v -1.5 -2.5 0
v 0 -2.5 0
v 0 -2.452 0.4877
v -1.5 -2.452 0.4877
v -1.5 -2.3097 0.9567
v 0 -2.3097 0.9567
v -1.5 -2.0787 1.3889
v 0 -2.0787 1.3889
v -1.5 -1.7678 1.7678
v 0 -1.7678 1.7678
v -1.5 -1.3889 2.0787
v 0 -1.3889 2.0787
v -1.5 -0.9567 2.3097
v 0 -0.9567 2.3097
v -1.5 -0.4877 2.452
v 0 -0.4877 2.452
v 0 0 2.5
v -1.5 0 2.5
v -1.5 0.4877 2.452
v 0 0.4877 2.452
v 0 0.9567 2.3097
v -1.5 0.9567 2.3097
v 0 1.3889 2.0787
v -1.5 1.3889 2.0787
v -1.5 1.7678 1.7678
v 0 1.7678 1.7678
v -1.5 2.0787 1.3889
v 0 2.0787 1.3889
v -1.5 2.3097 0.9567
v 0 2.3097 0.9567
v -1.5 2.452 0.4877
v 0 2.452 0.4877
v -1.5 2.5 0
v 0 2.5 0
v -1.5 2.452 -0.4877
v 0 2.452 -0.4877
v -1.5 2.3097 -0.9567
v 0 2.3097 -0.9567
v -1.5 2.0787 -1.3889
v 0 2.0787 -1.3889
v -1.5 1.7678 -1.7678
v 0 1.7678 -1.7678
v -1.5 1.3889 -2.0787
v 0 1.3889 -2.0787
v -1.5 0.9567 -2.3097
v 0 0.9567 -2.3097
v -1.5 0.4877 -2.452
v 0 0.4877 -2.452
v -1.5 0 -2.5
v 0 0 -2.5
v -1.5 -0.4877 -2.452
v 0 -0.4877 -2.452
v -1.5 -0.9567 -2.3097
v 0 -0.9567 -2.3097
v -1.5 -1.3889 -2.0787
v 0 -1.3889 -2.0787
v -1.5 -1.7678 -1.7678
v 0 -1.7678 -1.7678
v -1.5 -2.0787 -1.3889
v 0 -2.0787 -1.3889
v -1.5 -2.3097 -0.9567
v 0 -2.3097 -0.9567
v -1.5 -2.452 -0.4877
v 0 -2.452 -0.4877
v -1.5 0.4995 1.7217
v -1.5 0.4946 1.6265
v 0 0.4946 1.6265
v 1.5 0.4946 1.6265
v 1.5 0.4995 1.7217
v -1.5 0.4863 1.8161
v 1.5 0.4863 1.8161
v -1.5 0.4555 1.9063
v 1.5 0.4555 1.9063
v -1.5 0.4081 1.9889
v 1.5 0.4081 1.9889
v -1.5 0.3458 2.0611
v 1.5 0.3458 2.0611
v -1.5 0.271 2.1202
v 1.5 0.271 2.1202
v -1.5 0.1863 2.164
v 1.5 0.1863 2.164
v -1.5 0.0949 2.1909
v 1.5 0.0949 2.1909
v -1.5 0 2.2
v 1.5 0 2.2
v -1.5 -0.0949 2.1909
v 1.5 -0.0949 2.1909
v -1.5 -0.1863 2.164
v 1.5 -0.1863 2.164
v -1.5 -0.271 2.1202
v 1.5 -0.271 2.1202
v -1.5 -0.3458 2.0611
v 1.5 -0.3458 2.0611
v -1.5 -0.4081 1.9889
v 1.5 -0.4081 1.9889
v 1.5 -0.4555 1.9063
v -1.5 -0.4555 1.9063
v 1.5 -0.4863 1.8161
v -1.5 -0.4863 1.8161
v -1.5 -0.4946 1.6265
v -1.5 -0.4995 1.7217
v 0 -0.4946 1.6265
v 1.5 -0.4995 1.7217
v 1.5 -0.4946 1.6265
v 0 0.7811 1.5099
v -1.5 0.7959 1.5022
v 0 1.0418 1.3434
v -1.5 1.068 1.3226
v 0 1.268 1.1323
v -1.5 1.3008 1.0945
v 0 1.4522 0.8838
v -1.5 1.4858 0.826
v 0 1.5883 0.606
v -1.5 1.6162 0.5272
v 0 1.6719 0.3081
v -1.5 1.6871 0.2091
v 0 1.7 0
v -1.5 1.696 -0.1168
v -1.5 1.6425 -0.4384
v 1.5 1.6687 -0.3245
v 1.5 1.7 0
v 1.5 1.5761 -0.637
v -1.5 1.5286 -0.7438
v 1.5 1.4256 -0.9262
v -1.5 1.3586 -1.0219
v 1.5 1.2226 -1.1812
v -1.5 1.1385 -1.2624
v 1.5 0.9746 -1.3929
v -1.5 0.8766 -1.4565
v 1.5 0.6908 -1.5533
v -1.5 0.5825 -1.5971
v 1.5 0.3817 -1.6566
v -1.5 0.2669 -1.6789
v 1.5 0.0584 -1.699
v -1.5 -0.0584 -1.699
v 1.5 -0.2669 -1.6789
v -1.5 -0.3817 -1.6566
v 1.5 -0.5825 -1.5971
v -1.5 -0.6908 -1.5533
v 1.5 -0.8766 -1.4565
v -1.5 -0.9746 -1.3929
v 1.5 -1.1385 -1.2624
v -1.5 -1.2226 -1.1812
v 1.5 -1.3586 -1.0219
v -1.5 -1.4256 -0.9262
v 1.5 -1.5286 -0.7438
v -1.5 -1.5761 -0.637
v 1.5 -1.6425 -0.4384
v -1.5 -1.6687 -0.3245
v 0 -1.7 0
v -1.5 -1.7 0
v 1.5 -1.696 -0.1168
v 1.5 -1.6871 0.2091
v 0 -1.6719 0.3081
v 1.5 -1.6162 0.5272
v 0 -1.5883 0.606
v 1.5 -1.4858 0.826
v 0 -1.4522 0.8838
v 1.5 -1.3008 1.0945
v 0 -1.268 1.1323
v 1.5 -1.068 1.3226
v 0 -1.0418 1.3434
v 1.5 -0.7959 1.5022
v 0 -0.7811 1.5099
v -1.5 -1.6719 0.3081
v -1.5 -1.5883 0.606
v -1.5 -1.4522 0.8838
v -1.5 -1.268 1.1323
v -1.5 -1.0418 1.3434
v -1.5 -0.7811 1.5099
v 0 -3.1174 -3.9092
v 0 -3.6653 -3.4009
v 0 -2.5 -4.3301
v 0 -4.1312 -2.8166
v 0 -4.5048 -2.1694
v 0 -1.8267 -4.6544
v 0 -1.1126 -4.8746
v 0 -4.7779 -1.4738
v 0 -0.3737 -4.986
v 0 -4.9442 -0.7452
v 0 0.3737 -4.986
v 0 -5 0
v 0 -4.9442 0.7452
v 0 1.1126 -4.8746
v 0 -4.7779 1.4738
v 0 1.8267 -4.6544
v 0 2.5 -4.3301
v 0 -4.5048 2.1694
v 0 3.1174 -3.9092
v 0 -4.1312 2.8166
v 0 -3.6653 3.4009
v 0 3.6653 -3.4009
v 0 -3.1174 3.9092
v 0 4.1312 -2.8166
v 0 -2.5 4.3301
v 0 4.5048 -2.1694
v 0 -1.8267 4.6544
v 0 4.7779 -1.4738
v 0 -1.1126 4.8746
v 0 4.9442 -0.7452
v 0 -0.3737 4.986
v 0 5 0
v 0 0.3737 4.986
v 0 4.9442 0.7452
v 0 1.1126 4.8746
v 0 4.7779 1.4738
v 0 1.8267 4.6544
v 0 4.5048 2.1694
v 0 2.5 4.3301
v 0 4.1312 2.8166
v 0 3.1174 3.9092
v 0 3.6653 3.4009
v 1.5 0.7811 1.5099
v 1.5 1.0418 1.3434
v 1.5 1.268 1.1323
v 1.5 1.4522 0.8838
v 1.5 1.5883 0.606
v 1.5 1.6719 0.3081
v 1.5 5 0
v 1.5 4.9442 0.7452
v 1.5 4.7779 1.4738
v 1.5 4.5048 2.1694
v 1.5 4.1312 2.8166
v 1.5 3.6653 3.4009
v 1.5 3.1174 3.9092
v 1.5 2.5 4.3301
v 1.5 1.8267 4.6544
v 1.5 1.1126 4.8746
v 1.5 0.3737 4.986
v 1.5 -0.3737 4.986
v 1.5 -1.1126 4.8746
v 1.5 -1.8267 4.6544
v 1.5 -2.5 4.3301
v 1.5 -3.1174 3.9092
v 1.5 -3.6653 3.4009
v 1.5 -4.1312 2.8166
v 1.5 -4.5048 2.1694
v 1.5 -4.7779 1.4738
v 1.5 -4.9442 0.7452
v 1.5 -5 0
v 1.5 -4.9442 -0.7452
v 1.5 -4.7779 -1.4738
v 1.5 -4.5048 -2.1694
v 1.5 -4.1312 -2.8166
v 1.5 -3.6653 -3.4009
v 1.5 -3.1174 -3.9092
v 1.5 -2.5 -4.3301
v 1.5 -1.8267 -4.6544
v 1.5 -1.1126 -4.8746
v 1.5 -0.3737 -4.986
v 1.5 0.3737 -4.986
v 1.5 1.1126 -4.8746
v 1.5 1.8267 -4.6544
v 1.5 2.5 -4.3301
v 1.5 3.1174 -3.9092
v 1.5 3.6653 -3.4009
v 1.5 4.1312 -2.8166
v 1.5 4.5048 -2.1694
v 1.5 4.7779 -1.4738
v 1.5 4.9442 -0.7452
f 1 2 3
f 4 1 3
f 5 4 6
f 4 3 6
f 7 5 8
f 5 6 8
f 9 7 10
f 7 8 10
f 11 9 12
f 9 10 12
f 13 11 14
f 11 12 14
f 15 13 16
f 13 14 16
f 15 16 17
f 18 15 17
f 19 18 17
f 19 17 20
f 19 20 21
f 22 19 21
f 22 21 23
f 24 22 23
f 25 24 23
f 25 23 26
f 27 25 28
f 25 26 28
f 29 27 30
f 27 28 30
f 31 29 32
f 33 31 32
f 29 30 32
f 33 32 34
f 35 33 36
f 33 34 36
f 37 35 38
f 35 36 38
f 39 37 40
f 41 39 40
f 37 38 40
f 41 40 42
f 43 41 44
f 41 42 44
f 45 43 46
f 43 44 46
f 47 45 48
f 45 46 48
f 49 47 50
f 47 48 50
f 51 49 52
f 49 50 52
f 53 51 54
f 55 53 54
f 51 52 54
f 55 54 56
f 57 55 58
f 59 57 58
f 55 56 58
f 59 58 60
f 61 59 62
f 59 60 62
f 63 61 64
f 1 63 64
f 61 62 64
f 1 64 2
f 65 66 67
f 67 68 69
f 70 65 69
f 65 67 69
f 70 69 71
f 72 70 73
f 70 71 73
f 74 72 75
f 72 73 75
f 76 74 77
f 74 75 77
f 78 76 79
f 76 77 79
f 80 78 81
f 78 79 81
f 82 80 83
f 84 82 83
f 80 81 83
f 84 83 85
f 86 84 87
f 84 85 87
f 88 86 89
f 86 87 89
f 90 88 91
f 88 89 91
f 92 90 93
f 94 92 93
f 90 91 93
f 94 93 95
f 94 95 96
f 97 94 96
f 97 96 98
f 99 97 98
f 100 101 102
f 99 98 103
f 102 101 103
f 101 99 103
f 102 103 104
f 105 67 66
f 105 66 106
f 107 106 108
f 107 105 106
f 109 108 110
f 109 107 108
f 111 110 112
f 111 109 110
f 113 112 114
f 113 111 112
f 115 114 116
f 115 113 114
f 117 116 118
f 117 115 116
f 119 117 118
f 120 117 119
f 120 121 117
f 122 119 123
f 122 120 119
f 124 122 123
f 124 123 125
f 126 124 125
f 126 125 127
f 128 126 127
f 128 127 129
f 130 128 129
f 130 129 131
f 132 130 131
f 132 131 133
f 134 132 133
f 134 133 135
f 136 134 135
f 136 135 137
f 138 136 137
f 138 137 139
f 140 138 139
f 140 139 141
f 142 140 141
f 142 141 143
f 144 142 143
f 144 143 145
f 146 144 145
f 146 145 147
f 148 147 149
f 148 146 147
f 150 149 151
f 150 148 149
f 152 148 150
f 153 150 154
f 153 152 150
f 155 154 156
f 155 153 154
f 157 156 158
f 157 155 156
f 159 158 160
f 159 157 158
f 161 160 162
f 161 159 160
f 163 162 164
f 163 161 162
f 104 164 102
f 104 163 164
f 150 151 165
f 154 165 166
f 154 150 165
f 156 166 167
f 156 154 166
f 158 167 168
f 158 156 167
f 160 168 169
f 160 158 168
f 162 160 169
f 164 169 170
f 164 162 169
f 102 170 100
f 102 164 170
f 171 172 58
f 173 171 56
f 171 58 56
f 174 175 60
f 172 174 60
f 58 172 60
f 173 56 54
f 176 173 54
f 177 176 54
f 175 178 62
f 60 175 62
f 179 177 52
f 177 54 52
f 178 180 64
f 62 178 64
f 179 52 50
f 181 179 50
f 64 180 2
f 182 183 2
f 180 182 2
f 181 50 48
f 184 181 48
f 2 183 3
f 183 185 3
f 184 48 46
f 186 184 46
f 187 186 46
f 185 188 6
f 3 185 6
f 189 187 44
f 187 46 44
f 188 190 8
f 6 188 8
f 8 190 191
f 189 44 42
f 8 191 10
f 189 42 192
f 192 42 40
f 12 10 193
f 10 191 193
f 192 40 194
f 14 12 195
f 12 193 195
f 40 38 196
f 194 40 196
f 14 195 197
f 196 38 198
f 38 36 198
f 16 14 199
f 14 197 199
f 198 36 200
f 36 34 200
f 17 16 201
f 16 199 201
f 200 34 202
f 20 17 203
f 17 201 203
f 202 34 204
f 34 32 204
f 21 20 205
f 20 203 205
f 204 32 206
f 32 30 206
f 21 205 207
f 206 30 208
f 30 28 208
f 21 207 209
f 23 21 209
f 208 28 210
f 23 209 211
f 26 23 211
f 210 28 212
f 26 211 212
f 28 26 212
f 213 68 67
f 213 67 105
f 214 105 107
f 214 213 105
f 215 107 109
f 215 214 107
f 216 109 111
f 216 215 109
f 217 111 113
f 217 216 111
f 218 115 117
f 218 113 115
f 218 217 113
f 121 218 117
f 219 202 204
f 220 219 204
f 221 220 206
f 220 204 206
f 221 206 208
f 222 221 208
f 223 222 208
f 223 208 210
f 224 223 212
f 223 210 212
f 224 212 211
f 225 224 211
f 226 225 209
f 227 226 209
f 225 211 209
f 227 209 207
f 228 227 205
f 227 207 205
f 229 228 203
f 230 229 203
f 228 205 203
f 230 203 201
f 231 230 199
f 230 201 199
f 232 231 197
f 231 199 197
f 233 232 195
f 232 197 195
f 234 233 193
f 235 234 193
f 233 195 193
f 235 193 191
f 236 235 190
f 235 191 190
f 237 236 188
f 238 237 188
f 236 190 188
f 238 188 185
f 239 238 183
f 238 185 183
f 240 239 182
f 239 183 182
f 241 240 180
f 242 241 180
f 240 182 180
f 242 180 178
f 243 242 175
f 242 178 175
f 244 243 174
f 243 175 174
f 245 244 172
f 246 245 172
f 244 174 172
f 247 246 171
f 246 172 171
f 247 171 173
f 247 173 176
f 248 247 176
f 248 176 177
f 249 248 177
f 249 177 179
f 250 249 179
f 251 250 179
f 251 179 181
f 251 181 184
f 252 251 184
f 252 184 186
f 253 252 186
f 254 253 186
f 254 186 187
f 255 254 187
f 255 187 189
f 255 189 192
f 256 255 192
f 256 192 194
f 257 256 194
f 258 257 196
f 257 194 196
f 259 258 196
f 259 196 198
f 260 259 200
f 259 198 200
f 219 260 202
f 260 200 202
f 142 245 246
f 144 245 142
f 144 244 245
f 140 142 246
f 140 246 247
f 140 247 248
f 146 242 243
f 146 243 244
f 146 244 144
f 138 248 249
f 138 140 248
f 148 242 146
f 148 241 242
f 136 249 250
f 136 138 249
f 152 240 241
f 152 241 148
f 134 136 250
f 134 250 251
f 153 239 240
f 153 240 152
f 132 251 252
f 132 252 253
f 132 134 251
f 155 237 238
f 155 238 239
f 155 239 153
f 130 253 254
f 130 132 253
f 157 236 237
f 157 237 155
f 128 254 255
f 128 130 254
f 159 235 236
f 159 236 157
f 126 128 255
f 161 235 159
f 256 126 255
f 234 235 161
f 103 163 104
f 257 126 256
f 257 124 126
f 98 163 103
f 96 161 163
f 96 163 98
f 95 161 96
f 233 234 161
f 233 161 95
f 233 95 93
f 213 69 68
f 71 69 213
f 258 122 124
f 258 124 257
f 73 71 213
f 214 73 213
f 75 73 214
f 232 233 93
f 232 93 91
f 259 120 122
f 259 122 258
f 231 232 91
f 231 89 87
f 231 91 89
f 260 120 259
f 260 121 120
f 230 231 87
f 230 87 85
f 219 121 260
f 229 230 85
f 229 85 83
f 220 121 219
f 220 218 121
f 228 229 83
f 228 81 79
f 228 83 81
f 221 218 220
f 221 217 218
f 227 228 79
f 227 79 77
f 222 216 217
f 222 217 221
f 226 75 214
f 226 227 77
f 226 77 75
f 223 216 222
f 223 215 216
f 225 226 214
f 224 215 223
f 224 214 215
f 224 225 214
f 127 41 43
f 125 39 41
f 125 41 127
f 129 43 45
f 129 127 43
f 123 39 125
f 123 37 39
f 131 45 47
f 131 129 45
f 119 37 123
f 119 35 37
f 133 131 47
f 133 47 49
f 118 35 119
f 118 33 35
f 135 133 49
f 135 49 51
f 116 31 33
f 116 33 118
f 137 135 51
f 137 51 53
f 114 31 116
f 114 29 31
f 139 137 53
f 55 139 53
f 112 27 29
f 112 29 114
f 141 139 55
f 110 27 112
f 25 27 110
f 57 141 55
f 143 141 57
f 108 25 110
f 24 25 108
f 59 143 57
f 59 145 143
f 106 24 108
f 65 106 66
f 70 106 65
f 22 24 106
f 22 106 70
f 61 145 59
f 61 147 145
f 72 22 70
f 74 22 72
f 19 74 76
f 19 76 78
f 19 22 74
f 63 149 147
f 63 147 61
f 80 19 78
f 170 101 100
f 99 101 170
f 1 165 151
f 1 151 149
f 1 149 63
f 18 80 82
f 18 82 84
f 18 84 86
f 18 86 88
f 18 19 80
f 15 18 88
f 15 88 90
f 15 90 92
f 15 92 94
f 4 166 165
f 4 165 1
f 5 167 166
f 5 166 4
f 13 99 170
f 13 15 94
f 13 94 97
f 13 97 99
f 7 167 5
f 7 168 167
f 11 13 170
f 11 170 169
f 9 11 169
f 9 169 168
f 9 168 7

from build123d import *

# Parameters (mm, degrees)
F0_R     = 5
F0_R_2   = 1.7
F1_DEPTH = 1.5
F2_R     = 2.5
F2_R_2   = 1.7
F3_DEPTH = 1.5
F5_D     = 1


with BuildPart() as f1:
    # F0 (on Right) → F1 (new body)
    with BuildSketch(Plane.YZ):
        Circle(F0_R)
        Circle(F0_R_2, mode=Mode.SUBTRACT)
    extrude(amount=F1_DEPTH)

    # F2 (on face) → F3 (join)
    with BuildSketch(Plane(origin=(0, 0, 0), x_dir=(0, -1, 0), z_dir=(-1, 0, 0))):
        Circle(F2_R)
        Circle(F2_R_2, mode=Mode.SUBTRACT)
    extrude(amount=F3_DEPTH)

    # F5 (through all)
    with Locations(Plane(origin=(-1.5, 0, 0), x_dir=(0, -1, 0), z_dir=(-1, 0, 0))):
        with Locations((0, 1.7)):
            Hole(F5_D / 2)


solid = f1.part
